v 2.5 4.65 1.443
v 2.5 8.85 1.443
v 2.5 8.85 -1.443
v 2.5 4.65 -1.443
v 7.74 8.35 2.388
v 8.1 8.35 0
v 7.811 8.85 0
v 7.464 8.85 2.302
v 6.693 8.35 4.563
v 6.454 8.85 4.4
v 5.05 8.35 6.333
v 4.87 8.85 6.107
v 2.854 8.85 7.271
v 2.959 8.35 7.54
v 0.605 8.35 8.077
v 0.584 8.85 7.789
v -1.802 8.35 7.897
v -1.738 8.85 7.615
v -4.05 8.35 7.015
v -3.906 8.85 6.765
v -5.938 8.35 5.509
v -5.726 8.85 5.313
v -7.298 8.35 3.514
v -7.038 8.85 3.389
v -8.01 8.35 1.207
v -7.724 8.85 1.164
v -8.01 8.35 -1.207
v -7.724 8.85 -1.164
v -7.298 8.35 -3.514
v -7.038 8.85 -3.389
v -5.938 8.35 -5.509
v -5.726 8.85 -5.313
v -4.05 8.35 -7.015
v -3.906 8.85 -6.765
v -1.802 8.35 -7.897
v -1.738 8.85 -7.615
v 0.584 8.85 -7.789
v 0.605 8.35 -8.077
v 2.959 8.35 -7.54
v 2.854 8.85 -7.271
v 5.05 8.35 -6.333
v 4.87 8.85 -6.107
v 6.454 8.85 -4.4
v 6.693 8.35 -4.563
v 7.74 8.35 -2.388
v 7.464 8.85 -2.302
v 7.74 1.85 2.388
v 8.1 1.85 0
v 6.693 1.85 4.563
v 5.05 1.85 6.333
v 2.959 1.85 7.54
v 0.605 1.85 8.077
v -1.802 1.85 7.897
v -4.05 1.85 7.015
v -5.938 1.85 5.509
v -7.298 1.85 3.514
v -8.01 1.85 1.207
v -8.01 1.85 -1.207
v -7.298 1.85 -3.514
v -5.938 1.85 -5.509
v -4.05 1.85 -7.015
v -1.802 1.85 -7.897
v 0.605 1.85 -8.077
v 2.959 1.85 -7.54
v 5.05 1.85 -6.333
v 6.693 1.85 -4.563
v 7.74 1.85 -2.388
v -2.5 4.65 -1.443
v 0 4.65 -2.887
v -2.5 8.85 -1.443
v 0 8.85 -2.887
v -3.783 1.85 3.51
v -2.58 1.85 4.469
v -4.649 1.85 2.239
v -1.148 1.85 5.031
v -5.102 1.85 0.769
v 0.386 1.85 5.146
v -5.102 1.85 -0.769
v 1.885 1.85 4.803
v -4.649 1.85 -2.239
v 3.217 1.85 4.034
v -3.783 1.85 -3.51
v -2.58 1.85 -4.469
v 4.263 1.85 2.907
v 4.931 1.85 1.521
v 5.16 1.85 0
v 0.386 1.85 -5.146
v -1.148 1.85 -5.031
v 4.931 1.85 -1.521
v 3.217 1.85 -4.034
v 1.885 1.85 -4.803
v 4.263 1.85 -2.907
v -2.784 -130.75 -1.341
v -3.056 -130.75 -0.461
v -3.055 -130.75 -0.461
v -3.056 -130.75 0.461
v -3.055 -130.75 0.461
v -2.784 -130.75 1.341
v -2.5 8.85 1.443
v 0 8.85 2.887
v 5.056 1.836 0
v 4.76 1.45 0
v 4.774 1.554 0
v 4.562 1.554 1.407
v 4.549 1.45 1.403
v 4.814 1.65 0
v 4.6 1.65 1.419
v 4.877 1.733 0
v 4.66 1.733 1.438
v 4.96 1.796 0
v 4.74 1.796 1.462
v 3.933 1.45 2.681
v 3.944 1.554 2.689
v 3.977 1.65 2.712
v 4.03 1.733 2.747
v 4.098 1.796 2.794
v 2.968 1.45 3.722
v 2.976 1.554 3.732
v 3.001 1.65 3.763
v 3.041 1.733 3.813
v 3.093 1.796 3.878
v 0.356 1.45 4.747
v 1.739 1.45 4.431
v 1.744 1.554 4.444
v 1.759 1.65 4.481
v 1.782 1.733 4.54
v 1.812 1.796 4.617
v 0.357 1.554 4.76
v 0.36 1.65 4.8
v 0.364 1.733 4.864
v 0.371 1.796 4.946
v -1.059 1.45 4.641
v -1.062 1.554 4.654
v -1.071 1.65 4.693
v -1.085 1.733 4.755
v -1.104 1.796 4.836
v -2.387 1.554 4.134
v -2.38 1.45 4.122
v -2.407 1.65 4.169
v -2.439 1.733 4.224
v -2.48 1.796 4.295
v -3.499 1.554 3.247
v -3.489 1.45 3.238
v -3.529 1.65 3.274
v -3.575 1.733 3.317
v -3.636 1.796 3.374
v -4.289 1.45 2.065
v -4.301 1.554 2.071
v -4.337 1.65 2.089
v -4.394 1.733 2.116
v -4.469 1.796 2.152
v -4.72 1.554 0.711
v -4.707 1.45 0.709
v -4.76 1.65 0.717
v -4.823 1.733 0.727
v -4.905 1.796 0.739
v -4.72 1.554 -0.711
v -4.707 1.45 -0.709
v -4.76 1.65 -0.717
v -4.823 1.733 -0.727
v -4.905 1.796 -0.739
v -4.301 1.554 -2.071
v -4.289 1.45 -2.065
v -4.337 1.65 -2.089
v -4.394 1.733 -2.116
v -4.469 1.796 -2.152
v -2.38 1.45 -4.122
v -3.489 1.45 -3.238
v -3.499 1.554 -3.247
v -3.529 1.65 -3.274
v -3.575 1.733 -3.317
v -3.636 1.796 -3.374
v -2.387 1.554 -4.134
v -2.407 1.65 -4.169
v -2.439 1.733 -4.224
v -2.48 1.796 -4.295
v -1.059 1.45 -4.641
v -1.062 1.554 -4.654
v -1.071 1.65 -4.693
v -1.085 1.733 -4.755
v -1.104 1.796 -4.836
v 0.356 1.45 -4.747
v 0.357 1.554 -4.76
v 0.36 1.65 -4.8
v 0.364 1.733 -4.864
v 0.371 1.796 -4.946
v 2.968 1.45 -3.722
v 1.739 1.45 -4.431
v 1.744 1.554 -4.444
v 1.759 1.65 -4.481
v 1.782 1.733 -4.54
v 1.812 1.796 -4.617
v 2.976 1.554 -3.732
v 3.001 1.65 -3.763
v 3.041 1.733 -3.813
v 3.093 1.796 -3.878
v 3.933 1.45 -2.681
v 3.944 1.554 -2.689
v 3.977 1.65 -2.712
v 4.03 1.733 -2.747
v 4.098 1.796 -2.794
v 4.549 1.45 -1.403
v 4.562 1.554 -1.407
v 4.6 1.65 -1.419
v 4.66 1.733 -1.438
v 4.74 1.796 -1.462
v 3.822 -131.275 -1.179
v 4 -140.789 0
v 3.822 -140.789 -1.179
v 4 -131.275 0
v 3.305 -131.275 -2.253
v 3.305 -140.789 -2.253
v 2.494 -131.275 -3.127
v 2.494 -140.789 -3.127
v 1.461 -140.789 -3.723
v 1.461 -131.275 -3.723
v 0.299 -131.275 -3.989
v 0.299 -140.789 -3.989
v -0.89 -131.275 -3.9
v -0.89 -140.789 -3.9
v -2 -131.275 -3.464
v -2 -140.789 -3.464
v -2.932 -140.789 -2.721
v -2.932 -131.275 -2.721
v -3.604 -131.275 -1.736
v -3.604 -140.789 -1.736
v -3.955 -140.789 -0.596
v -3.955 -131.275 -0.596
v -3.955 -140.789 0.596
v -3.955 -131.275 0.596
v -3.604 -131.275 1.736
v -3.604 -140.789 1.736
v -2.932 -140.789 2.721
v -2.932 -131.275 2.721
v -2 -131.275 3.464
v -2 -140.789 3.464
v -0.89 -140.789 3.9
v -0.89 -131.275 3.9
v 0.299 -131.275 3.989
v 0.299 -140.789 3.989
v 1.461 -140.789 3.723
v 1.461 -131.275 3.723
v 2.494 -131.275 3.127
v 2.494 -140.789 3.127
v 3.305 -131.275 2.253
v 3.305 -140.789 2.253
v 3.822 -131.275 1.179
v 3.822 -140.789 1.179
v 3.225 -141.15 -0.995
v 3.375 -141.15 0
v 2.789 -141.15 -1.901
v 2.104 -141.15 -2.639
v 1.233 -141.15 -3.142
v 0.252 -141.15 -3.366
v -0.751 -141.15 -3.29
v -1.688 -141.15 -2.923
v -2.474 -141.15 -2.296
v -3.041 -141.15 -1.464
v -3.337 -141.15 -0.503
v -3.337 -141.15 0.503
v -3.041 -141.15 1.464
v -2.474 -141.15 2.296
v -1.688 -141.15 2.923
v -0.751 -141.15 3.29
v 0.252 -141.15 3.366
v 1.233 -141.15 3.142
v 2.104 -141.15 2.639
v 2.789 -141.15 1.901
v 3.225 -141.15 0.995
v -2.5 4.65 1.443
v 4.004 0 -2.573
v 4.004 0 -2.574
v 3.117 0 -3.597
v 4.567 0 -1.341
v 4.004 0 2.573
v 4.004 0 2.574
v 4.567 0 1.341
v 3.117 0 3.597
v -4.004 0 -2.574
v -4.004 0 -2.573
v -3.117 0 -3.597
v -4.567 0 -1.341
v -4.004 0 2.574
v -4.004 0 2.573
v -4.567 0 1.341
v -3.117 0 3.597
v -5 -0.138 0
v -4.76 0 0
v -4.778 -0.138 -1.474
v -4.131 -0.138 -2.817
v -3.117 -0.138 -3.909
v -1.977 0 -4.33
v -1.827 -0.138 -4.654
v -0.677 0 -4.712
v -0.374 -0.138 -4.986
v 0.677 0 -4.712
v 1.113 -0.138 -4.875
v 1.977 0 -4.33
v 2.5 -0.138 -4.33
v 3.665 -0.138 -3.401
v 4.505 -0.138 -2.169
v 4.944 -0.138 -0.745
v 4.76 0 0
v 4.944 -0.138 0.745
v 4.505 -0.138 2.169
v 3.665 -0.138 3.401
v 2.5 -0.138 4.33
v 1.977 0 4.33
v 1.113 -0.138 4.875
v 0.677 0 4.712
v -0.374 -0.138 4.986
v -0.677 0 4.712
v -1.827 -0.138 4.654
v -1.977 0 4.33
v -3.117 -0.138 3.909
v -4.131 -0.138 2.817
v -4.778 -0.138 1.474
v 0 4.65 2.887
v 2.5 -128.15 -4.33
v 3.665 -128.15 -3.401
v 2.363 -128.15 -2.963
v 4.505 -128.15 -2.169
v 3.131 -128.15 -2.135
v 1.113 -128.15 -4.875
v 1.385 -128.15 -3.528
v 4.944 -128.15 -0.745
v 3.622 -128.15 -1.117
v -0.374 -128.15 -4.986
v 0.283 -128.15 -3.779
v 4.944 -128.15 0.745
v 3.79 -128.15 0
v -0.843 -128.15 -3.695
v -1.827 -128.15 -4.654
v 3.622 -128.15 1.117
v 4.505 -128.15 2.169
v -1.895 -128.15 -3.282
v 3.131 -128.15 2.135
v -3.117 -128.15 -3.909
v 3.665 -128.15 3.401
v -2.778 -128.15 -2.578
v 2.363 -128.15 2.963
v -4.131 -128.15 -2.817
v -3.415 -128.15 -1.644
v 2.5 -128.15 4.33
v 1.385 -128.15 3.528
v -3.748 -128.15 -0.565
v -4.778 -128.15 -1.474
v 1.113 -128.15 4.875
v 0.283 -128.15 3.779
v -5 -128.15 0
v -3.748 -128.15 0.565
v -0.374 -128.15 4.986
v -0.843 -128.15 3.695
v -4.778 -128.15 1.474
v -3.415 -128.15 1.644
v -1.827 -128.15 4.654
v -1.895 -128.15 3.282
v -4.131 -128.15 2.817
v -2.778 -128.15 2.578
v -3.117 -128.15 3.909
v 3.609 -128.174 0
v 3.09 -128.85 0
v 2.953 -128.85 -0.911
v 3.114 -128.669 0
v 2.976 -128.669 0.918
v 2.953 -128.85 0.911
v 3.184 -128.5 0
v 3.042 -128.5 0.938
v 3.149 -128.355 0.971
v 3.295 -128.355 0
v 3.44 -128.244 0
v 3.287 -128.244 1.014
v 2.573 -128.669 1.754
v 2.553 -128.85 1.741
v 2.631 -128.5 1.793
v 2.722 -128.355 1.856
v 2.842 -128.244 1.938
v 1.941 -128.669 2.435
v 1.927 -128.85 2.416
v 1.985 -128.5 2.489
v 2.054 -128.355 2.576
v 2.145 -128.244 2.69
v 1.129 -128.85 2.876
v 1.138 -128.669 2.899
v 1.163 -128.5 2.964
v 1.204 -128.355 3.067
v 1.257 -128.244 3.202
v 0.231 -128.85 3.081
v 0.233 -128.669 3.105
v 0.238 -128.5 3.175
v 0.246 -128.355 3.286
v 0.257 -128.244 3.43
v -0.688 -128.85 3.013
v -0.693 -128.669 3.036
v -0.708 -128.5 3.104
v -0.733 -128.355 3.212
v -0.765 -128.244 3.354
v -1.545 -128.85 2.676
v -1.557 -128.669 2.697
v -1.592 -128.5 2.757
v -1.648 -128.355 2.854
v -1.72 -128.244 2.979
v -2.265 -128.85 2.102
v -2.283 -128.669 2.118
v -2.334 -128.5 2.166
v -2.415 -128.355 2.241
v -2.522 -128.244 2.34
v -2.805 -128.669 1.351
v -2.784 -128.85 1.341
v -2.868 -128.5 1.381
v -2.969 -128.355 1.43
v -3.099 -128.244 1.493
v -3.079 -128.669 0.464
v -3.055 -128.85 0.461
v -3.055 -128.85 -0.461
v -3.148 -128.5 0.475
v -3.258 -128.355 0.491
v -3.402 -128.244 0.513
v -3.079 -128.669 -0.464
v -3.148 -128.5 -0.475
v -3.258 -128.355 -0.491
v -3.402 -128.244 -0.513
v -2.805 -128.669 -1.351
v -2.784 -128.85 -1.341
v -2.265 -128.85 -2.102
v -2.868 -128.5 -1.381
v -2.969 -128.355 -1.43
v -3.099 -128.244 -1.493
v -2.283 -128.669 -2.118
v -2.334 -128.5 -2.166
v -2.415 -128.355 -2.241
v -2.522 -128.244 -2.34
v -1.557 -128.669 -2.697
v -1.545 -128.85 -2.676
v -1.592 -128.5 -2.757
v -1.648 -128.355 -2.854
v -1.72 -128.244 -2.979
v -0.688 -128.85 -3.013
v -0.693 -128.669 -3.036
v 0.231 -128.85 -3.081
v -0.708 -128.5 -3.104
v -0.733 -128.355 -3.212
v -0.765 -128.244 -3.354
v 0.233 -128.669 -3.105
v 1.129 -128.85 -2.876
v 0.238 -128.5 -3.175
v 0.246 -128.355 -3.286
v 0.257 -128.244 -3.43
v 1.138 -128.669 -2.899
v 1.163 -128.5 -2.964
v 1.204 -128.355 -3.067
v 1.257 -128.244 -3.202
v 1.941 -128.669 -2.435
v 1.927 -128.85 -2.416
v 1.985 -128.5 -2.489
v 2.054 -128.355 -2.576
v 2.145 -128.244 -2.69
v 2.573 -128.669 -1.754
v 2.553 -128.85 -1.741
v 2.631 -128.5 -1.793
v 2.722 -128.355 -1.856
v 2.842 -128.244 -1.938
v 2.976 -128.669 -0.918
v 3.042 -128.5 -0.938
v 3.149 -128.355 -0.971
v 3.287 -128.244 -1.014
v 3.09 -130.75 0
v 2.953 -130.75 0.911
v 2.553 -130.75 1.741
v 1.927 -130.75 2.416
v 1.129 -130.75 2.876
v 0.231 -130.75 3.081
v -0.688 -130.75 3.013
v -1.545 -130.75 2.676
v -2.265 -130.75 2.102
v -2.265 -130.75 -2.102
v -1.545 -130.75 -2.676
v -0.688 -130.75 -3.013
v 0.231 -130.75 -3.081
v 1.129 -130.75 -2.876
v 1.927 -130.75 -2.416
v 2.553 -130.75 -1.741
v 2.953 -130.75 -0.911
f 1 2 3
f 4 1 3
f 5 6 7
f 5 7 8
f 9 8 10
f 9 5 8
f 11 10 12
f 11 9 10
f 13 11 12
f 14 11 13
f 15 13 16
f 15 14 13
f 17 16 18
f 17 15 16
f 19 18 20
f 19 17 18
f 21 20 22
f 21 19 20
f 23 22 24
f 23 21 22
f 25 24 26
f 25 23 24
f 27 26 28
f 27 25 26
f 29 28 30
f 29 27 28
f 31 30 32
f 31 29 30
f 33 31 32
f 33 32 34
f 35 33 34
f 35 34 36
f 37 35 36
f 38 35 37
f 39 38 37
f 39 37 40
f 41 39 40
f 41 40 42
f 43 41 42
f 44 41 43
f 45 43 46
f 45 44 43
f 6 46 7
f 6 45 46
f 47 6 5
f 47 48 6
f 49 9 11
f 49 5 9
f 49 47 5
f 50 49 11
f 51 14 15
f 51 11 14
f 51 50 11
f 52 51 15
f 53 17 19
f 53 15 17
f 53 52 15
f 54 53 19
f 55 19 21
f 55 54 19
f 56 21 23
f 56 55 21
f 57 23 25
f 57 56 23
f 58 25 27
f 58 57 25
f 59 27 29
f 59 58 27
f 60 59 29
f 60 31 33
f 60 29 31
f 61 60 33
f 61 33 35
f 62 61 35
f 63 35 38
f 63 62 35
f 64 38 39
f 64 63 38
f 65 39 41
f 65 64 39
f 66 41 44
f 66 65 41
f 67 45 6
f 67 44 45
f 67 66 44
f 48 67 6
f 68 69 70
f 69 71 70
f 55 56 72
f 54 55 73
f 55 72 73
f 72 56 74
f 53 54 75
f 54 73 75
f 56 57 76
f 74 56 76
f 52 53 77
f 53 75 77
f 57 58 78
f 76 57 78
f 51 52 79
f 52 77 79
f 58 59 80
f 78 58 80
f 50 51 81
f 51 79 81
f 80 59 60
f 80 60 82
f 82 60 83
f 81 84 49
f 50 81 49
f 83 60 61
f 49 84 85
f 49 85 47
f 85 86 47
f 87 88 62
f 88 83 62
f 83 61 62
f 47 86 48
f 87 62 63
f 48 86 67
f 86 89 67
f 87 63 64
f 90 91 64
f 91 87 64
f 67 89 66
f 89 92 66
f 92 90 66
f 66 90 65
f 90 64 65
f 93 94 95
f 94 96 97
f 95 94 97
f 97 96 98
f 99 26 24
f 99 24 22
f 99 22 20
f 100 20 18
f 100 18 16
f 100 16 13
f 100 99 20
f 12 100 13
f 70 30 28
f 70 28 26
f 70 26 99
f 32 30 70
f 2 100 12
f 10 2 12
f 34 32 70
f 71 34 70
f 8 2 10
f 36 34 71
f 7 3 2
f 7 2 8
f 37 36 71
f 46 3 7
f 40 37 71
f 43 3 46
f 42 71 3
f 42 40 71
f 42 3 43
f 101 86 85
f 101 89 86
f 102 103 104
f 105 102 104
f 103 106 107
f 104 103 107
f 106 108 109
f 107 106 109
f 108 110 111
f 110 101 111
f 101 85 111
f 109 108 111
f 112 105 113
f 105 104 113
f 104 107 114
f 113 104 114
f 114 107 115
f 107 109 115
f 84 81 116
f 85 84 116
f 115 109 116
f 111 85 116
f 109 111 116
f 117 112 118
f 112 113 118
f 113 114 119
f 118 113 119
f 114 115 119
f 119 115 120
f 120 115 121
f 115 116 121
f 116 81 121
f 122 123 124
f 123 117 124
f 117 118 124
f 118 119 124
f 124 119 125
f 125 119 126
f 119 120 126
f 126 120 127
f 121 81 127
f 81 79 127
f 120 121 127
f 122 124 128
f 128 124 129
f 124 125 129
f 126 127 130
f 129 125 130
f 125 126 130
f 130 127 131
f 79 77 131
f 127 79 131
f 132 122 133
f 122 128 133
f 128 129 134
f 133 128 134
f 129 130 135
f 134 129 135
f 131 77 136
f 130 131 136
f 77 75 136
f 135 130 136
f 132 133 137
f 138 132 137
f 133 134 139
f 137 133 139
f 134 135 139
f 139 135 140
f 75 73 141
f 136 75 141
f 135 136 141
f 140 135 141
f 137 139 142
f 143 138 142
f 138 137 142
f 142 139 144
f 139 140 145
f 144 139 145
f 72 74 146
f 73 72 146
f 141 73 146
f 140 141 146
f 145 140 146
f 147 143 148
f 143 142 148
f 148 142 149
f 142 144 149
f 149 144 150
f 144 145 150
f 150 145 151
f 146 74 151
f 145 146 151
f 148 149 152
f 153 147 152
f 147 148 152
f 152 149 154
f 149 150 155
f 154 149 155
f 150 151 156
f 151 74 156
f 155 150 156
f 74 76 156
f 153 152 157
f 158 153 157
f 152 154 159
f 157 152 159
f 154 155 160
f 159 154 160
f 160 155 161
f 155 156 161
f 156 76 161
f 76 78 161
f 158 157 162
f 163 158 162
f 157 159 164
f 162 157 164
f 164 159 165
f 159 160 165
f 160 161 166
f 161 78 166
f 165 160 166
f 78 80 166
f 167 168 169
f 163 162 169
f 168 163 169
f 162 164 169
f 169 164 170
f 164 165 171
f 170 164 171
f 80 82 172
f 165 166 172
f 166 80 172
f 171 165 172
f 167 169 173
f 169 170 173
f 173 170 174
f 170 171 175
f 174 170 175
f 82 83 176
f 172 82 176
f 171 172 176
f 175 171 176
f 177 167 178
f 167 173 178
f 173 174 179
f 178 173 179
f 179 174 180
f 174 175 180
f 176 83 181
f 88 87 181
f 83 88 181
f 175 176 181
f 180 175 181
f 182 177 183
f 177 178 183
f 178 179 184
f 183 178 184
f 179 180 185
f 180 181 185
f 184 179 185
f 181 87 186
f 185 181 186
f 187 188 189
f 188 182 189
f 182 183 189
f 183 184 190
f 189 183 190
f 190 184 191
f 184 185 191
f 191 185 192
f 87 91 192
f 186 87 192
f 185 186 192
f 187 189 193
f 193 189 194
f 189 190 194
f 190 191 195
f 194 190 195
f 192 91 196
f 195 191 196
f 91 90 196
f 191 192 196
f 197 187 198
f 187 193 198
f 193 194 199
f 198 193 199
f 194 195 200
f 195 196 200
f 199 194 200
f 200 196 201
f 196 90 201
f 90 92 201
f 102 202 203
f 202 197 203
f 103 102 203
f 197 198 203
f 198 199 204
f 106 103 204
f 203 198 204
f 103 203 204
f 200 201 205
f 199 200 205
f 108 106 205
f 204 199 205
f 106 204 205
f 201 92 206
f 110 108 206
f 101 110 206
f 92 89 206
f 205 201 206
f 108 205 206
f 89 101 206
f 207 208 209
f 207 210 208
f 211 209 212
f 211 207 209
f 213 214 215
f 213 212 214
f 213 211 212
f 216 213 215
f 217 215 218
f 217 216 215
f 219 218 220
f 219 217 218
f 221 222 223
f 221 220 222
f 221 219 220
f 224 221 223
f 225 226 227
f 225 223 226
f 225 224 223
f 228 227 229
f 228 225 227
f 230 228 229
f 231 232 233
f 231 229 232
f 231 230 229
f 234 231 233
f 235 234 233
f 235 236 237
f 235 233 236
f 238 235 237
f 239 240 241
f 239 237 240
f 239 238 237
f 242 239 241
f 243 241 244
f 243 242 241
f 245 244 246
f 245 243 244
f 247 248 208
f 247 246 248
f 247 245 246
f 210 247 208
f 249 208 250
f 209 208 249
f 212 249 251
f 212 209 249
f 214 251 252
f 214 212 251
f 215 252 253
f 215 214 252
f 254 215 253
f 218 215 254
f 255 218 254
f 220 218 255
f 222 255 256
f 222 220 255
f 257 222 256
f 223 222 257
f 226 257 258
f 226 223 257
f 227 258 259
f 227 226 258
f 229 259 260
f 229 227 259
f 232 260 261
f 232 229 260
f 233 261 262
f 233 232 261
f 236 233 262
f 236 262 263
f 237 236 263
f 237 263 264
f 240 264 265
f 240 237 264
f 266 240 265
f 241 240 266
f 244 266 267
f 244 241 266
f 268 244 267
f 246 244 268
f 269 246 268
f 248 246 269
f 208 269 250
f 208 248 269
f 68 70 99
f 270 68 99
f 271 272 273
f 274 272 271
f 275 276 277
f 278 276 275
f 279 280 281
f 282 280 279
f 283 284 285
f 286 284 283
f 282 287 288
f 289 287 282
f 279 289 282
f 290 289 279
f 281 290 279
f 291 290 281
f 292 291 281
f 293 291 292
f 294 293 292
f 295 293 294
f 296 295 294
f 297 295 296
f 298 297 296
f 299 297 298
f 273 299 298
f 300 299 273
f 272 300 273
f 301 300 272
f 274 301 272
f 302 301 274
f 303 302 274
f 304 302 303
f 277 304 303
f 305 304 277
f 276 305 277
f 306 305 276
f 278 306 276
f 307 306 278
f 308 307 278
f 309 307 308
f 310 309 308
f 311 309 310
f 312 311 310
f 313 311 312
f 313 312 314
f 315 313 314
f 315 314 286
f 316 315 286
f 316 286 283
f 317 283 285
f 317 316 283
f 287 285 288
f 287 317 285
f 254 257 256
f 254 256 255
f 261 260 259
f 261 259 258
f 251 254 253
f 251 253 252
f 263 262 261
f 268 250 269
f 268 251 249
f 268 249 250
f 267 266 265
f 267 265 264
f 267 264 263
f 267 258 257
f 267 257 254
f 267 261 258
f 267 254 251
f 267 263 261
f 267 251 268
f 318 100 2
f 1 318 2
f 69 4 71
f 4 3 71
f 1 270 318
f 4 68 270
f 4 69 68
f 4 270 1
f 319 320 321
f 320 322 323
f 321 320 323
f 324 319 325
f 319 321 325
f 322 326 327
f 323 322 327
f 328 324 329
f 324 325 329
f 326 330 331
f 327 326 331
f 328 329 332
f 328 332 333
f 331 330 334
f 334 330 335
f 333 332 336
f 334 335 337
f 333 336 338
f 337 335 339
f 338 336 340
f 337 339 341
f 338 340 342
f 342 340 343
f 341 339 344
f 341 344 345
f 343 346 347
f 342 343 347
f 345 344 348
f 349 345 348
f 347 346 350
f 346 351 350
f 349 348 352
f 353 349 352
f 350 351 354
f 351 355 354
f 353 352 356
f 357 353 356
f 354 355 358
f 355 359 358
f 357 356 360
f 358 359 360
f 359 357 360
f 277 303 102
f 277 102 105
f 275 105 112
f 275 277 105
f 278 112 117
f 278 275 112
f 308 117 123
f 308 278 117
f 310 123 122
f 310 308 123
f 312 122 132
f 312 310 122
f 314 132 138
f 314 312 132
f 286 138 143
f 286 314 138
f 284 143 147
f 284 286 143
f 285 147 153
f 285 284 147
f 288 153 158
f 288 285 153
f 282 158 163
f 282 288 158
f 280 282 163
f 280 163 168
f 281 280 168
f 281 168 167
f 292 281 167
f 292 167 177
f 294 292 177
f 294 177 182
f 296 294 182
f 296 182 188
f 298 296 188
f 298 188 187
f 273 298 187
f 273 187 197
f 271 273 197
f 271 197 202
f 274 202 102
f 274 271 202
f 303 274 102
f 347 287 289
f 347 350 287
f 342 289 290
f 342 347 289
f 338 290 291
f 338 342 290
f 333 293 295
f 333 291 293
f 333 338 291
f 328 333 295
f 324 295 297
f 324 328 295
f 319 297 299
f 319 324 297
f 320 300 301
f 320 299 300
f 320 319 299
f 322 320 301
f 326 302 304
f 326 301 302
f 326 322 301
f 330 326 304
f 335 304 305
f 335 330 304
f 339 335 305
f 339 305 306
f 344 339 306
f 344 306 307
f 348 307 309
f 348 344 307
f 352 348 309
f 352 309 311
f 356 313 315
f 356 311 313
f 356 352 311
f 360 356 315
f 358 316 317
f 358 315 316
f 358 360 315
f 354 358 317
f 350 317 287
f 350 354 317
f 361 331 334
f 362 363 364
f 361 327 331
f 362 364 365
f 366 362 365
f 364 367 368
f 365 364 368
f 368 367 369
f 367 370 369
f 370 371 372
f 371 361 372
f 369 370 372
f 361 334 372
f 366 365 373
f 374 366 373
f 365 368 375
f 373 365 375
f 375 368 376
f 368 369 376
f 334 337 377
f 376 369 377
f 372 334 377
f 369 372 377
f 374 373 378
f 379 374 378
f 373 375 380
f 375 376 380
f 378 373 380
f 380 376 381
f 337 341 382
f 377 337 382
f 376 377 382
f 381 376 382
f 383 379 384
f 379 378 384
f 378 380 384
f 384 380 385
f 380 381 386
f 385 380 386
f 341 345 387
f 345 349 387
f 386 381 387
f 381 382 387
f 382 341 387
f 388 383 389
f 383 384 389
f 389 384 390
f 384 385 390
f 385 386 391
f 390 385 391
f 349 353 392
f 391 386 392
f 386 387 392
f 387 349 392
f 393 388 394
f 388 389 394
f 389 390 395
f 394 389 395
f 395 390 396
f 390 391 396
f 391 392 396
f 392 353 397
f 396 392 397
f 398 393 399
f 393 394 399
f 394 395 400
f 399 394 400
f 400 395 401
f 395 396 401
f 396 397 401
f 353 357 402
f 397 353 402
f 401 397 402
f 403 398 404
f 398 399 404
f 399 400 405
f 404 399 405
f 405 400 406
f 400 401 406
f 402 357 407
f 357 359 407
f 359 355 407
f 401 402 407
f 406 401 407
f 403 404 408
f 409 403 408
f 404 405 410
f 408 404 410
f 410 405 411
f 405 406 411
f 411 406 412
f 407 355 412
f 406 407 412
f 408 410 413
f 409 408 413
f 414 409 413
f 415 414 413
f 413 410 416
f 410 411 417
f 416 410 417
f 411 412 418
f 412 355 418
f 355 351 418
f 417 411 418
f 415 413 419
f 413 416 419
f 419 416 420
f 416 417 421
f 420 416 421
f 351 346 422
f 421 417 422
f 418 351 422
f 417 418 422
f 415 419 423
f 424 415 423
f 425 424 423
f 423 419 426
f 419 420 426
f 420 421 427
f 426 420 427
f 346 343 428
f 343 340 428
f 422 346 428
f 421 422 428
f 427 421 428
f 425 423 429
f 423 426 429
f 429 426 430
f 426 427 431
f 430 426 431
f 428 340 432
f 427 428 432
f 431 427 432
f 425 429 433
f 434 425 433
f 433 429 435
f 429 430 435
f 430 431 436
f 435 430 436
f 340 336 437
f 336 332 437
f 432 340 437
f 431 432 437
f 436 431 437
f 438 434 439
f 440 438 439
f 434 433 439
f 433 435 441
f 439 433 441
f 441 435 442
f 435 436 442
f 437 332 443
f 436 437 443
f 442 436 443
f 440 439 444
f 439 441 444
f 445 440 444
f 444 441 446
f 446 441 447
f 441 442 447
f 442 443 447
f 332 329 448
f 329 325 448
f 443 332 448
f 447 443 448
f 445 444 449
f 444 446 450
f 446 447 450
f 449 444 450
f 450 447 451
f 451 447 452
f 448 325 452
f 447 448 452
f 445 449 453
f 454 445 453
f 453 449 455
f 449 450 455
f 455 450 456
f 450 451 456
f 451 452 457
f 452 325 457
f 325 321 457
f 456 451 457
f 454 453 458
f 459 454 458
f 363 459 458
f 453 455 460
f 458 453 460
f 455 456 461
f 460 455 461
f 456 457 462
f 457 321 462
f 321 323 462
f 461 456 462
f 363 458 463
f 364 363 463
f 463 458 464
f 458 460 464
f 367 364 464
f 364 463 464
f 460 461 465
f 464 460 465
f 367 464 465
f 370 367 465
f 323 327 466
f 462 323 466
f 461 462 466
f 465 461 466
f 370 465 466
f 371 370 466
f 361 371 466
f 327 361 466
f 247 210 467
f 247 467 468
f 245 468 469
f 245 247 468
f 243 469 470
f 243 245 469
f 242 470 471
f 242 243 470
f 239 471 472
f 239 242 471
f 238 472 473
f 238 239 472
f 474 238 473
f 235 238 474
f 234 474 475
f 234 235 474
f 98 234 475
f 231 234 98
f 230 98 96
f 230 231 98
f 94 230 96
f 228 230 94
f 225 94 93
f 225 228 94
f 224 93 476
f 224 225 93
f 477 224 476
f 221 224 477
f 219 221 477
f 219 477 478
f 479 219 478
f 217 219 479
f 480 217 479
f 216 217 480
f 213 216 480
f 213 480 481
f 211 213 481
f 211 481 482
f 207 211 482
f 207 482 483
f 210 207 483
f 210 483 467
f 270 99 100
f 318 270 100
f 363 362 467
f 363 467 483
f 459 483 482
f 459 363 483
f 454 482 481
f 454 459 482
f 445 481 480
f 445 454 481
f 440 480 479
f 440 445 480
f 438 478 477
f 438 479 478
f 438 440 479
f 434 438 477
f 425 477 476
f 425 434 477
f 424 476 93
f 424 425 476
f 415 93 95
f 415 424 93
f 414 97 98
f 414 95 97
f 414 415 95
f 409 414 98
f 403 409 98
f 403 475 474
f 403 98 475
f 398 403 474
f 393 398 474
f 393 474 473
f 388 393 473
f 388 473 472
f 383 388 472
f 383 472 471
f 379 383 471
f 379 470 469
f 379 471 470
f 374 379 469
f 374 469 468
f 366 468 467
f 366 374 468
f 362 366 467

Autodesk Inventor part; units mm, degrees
ref_plane "YZ Plane" through (0, 0, 0) normal (1, 0, 0) x (0, 1, 0)
ref_plane "XZ Plane" through (0, 0, 0) normal (0, 1, 0) x (-1, 0, 0)
ref_plane "XY Plane" through (0, 0, 0) normal (0, 0, 1) x (1, 0, 0)
sketch "Sketch1" plane through (0, 0, 0) normal (0, 0, 1) x (1, 0, 0)
  line L0 (0, 0) -> (-5, 0)
  line L1 (-5, 0) -> (-5, -128.15)
  line L2 (-5, -128.15) -> (0, -128.15)
  line L3 (0, -128.15) -> (0, 0)
  line L4 (0, 0) -> (-13.1356, 0) construction
  dimension "d1" = 128.15
  dimension "d2" = 5
revolve "Shoulder" add sketch "Sketch1" angle 360 about axis through (0, -128.15, 0) along (0, 1, 0)
sketch "Sketch2" plane through (0, 0, 0) normal (0, 1, 0) x (1, 0, 0)
  circle A0 centre (0, 0) radius 5 projected
  circle A1 centre (0, 0) radius 4.76
  dimension "d3" = 9.52
extrude "Shoulder_neck" add sketch "Sketch2" along normal blind 1.85 contours A1
sketch "Sketch3" plane through (0, 1.85, 0) normal (0, 1, 0) x (1, 0, 0)
  circle A0 centre (0, 0) radius 4.76 projected
  circle A1 centre (0, 0) radius 8.1
  dimension "d6" = 16.2
extrude "Head" add sketch "Sketch3" along normal blind 7 contours A0 | A1
sketch "Sketch4" plane through (0, -128.15, 0) normal (0, -1, 0) x (1, 0, 0)
  circle A0 centre (0, 0) radius 5 projected
  circle A1 centre (0, 0) radius 3.09
  dimension "d9" = 6.18
extrude "Thread_neck" add sketch "Sketch4" along normal blind 2.6 contours A1
sketch "Sketch5" plane through (0, -130.75, 0) normal (0, -1, 0) x (1, 0, 0)
  circle A0 centre (0, 0) radius 3.09 projected
  circle A1 centre (0, 0) radius 4
  dimension "d12" = 8
extrude "Thread_shoulder" add sketch "Sketch5" along normal blind 10.4 contours A0 | A1
sketch "Sketch6" plane through (0, 8.85, 0) normal (0, 1, 0) x (1, 0, 0)
  circle A0 centre (0, 0) radius 8.1 projected
  circle A1 centre (0, 0) radius 2.5 construction
  line L0 (-2.5, 1.4434) -> (-2.5, -1.4434)
  line L1 (-2.5, -1.4434) -> (0, -2.8868)
  line L2 (0, -2.8868) -> (2.5, -1.4434)
  line L3 (2.5, -1.4434) -> (2.5, 1.4434)
  line L4 (2.5, 1.4434) -> (0, 2.8868)
  line L5 (0, 2.8868) -> (-2.5, 1.4434)
  dimension "d15" = 5
extrude "Hex" cut sketch "Sketch6" against normal blind 4.2 contours L5 L4 L3 L2 L1 L0
chamfer "Chamfer1" distance 0.24 angle 30 1 edges at (5, 0, 0) measured on face at (-4.8255, 0, -0.7786)
fillet "Fillet1" radius 0.4 1 edges at (-4.76, 1.85, 0)
chamfer "Chamfer2" distance 0.5 angle 30 1 edges at (-8.1, 8.85, 0) measured on face at (7.9951, 6.5167, 1.2993)
chamfer "Chamfer3" distance 0.625 angle 30 1 edges at (-4, -141.15, 0) measured on face at (0.7574, -141.15, 1.0973)
fillet "Fillet2" radius 0.7 1 edges at (-3.09, -128.15, 0)
chamfer "Chamfer7" distance 0.91 angle 30 1 edges at (-4, -130.75, 0) measured on face at (3.6579, -130.75, -0.3191)
thread "Thread" size "M8x1.25" class "6g" standard "ANSI Metric M Profile" full length
equation "\"d3\" = Shoulder_neck_dia"
equation "\"d4\" = Shoulder_neck_length"
equation "\"d6\" = Head_diameter"
equation "\"d7\" = Head_height"
equation "\"d9\" = Thread_neck_dia"
equation "\"d10\" = Thread_neck_length"
equation "\"d12\" = Thread_diameter"
equation "\"d13\" = Thread_length - Thread_neck_length"
equation "\"d15\" = Hex_size"
equation "\"d16\" = Hex_length"
equation "\"d18\" = -0.5 * Shoulder_neck_dia + 0.5 * Shoulder_diameter"
equation "\"d64\" = -0.5 * Shoulder_neck_dia + 0.5 * Shoulder_diameter"
equation "\"d21\" = 0.1 * Hex_size"
equation "\"d65\" = 0.1 * Hex_size"
equation "\"d23\" = 0.5 * Thread_pitch"
equation "\"d66\" = 0.5 * Thread_pitch"
equation "\"d25\" = Thread_neck_radius"
equation "\"d60\" = -0.5 * Thread_neck_dia + 0.5 * Thread_diameter"
equation "\"d67\" = -0.5 * Thread_neck_dia + 0.5 * Thread_diameter"
equation "\"d1\" = Shoulder_length - Shoulder_neck_length"
equation "\"d2\" = 0.5 * Shoulder_diameter"
equation "\"Shoulder_length\" = 130"
equation "\"Shoulder_neck_dia\" = 9.52"
equation "\"Thread_diameter\" = 8"
equation "\"Thread_length\" = 13"
equation "\"Head_diameter\" = 16.2"
equation "\"Head_height\" = 7"
equation "\"Thread_neck_dia\" = 6.18"
equation "\"Hex_size\" = 5"
equation "\"Hex_length\" = 4.2"
equation "\"Thread_pitch\" = 1.25"
equation "\"Shoulder_neck_length\" = 1.85"
equation "\"Thread_neck_length\" = 2.6"
equation "\"Thread_neck_radius\" = 0.7"
equation "\"Shoulder_diameter\" = 10"
properties part number "SCREW,SHOULDER,P,12.9,M10X130MM" material "Steel, High Strength Low Alloy"
